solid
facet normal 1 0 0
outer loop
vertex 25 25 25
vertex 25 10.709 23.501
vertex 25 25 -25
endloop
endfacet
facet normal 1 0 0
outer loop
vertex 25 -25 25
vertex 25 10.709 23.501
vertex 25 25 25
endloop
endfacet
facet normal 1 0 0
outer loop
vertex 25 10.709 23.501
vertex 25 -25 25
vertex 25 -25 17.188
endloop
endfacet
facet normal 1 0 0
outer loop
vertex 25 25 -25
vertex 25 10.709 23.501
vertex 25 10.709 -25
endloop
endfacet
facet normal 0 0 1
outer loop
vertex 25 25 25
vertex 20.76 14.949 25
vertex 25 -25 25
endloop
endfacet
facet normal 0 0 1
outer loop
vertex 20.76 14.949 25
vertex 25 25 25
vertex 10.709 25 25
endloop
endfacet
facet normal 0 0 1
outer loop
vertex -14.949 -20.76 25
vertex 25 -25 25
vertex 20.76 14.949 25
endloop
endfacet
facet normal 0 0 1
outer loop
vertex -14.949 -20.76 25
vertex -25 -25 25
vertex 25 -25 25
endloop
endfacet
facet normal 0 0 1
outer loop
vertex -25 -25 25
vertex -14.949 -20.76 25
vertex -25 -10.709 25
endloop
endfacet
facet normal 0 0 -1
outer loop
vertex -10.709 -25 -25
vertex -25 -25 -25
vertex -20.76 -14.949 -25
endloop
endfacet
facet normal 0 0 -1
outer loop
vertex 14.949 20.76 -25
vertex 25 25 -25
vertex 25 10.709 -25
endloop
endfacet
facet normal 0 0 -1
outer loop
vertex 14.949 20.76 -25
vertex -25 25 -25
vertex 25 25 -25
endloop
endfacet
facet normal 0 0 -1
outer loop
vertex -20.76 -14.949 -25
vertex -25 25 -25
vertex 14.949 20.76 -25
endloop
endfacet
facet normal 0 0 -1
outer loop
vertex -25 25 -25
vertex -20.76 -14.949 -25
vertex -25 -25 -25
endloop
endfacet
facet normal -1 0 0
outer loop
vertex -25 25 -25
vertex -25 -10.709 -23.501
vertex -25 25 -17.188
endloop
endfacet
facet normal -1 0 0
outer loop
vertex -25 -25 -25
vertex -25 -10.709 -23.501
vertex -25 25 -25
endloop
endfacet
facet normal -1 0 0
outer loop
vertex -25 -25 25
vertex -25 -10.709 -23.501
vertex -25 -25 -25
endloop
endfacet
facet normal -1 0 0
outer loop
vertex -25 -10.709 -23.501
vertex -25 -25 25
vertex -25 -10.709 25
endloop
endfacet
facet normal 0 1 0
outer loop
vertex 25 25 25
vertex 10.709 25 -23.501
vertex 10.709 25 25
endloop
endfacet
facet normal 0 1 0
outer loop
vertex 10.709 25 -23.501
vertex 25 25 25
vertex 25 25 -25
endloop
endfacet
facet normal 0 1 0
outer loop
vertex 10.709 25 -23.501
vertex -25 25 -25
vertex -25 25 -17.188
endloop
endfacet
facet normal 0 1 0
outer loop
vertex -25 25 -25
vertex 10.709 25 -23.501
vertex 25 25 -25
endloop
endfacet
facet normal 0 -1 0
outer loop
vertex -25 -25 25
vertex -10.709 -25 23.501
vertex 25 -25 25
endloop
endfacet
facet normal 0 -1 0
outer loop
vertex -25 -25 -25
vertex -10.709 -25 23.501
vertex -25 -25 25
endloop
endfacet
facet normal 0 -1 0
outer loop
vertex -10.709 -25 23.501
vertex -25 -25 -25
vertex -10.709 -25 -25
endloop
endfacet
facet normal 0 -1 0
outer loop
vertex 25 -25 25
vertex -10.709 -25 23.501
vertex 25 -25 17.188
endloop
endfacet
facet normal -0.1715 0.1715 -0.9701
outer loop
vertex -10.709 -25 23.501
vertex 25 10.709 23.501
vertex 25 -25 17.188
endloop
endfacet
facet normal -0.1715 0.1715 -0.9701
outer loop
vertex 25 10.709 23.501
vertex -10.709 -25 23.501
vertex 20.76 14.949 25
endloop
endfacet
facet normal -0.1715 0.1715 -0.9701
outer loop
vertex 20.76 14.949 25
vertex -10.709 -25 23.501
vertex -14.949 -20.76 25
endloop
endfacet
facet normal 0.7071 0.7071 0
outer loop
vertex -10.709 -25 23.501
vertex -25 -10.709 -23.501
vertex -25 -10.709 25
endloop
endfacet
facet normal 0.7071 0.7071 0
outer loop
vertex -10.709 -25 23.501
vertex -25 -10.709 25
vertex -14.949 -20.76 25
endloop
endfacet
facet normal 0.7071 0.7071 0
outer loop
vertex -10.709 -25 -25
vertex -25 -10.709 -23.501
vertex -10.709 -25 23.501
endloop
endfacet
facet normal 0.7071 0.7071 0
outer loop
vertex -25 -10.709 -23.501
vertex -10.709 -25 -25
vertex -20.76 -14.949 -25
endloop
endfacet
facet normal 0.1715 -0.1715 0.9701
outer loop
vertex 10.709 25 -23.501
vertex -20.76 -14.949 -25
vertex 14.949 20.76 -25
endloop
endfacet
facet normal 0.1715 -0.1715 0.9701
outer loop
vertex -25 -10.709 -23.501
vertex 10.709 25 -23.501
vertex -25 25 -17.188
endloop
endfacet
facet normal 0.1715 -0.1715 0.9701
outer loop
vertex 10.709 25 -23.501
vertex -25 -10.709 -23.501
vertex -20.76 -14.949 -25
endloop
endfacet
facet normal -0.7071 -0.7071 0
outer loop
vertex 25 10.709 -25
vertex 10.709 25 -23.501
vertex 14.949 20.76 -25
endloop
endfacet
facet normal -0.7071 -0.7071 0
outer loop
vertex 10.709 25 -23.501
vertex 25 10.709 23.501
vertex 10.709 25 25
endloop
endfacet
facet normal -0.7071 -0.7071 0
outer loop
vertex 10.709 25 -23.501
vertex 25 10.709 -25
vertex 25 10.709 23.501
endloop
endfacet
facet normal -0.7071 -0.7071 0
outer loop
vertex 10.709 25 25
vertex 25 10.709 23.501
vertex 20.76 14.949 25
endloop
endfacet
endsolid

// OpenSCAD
/*
RupertCube

For a polyhedron to be classed as Rupert, it must be possible to cut a hole in it that is large enough for an identical polyhedron to pass through. It sounds impossible, but many polyhedra havethis property, including the cube.

This file constructs a cube with a hole in it that a cube of the same size will fit through.

Copyright (C) 2020 Sam Hartburn
This program is free software: you can redistribute it and/or modify
it under the terms of the GNU General Public License as published by
the Free Software Foundation, either version 3 of the License, or
(at your option) any later version.
This program is distributed in the hope that it will be useful,
but WITHOUT ANY WARRANTY; without even the implied warranty of
MERCHANTABILITY or FITNESS FOR A PARTICULAR PURPOSE.  See the
GNU General Public License for more details.
You should have received a copy of the GNU General Public License
along with this program.  If not, see <https://www.gnu.org/licenses/>.
author: Sam Hartburn
email: sam@samhartburn.co.uk
website: www.samhartburn.co.uk
*/

d = 50; //Side length of cube
d2=d*1.01; //Side length of hole. This can be up to 1.0606... times the side length of the cube. The bigger it is, the thinner the remaining section of cube will be.

difference() {
    cube([d,d,d], center=true);

    rotate([atan(1/4),0,45]) {
        cube([d2,d2*10,d2],center=true);
    }
}
